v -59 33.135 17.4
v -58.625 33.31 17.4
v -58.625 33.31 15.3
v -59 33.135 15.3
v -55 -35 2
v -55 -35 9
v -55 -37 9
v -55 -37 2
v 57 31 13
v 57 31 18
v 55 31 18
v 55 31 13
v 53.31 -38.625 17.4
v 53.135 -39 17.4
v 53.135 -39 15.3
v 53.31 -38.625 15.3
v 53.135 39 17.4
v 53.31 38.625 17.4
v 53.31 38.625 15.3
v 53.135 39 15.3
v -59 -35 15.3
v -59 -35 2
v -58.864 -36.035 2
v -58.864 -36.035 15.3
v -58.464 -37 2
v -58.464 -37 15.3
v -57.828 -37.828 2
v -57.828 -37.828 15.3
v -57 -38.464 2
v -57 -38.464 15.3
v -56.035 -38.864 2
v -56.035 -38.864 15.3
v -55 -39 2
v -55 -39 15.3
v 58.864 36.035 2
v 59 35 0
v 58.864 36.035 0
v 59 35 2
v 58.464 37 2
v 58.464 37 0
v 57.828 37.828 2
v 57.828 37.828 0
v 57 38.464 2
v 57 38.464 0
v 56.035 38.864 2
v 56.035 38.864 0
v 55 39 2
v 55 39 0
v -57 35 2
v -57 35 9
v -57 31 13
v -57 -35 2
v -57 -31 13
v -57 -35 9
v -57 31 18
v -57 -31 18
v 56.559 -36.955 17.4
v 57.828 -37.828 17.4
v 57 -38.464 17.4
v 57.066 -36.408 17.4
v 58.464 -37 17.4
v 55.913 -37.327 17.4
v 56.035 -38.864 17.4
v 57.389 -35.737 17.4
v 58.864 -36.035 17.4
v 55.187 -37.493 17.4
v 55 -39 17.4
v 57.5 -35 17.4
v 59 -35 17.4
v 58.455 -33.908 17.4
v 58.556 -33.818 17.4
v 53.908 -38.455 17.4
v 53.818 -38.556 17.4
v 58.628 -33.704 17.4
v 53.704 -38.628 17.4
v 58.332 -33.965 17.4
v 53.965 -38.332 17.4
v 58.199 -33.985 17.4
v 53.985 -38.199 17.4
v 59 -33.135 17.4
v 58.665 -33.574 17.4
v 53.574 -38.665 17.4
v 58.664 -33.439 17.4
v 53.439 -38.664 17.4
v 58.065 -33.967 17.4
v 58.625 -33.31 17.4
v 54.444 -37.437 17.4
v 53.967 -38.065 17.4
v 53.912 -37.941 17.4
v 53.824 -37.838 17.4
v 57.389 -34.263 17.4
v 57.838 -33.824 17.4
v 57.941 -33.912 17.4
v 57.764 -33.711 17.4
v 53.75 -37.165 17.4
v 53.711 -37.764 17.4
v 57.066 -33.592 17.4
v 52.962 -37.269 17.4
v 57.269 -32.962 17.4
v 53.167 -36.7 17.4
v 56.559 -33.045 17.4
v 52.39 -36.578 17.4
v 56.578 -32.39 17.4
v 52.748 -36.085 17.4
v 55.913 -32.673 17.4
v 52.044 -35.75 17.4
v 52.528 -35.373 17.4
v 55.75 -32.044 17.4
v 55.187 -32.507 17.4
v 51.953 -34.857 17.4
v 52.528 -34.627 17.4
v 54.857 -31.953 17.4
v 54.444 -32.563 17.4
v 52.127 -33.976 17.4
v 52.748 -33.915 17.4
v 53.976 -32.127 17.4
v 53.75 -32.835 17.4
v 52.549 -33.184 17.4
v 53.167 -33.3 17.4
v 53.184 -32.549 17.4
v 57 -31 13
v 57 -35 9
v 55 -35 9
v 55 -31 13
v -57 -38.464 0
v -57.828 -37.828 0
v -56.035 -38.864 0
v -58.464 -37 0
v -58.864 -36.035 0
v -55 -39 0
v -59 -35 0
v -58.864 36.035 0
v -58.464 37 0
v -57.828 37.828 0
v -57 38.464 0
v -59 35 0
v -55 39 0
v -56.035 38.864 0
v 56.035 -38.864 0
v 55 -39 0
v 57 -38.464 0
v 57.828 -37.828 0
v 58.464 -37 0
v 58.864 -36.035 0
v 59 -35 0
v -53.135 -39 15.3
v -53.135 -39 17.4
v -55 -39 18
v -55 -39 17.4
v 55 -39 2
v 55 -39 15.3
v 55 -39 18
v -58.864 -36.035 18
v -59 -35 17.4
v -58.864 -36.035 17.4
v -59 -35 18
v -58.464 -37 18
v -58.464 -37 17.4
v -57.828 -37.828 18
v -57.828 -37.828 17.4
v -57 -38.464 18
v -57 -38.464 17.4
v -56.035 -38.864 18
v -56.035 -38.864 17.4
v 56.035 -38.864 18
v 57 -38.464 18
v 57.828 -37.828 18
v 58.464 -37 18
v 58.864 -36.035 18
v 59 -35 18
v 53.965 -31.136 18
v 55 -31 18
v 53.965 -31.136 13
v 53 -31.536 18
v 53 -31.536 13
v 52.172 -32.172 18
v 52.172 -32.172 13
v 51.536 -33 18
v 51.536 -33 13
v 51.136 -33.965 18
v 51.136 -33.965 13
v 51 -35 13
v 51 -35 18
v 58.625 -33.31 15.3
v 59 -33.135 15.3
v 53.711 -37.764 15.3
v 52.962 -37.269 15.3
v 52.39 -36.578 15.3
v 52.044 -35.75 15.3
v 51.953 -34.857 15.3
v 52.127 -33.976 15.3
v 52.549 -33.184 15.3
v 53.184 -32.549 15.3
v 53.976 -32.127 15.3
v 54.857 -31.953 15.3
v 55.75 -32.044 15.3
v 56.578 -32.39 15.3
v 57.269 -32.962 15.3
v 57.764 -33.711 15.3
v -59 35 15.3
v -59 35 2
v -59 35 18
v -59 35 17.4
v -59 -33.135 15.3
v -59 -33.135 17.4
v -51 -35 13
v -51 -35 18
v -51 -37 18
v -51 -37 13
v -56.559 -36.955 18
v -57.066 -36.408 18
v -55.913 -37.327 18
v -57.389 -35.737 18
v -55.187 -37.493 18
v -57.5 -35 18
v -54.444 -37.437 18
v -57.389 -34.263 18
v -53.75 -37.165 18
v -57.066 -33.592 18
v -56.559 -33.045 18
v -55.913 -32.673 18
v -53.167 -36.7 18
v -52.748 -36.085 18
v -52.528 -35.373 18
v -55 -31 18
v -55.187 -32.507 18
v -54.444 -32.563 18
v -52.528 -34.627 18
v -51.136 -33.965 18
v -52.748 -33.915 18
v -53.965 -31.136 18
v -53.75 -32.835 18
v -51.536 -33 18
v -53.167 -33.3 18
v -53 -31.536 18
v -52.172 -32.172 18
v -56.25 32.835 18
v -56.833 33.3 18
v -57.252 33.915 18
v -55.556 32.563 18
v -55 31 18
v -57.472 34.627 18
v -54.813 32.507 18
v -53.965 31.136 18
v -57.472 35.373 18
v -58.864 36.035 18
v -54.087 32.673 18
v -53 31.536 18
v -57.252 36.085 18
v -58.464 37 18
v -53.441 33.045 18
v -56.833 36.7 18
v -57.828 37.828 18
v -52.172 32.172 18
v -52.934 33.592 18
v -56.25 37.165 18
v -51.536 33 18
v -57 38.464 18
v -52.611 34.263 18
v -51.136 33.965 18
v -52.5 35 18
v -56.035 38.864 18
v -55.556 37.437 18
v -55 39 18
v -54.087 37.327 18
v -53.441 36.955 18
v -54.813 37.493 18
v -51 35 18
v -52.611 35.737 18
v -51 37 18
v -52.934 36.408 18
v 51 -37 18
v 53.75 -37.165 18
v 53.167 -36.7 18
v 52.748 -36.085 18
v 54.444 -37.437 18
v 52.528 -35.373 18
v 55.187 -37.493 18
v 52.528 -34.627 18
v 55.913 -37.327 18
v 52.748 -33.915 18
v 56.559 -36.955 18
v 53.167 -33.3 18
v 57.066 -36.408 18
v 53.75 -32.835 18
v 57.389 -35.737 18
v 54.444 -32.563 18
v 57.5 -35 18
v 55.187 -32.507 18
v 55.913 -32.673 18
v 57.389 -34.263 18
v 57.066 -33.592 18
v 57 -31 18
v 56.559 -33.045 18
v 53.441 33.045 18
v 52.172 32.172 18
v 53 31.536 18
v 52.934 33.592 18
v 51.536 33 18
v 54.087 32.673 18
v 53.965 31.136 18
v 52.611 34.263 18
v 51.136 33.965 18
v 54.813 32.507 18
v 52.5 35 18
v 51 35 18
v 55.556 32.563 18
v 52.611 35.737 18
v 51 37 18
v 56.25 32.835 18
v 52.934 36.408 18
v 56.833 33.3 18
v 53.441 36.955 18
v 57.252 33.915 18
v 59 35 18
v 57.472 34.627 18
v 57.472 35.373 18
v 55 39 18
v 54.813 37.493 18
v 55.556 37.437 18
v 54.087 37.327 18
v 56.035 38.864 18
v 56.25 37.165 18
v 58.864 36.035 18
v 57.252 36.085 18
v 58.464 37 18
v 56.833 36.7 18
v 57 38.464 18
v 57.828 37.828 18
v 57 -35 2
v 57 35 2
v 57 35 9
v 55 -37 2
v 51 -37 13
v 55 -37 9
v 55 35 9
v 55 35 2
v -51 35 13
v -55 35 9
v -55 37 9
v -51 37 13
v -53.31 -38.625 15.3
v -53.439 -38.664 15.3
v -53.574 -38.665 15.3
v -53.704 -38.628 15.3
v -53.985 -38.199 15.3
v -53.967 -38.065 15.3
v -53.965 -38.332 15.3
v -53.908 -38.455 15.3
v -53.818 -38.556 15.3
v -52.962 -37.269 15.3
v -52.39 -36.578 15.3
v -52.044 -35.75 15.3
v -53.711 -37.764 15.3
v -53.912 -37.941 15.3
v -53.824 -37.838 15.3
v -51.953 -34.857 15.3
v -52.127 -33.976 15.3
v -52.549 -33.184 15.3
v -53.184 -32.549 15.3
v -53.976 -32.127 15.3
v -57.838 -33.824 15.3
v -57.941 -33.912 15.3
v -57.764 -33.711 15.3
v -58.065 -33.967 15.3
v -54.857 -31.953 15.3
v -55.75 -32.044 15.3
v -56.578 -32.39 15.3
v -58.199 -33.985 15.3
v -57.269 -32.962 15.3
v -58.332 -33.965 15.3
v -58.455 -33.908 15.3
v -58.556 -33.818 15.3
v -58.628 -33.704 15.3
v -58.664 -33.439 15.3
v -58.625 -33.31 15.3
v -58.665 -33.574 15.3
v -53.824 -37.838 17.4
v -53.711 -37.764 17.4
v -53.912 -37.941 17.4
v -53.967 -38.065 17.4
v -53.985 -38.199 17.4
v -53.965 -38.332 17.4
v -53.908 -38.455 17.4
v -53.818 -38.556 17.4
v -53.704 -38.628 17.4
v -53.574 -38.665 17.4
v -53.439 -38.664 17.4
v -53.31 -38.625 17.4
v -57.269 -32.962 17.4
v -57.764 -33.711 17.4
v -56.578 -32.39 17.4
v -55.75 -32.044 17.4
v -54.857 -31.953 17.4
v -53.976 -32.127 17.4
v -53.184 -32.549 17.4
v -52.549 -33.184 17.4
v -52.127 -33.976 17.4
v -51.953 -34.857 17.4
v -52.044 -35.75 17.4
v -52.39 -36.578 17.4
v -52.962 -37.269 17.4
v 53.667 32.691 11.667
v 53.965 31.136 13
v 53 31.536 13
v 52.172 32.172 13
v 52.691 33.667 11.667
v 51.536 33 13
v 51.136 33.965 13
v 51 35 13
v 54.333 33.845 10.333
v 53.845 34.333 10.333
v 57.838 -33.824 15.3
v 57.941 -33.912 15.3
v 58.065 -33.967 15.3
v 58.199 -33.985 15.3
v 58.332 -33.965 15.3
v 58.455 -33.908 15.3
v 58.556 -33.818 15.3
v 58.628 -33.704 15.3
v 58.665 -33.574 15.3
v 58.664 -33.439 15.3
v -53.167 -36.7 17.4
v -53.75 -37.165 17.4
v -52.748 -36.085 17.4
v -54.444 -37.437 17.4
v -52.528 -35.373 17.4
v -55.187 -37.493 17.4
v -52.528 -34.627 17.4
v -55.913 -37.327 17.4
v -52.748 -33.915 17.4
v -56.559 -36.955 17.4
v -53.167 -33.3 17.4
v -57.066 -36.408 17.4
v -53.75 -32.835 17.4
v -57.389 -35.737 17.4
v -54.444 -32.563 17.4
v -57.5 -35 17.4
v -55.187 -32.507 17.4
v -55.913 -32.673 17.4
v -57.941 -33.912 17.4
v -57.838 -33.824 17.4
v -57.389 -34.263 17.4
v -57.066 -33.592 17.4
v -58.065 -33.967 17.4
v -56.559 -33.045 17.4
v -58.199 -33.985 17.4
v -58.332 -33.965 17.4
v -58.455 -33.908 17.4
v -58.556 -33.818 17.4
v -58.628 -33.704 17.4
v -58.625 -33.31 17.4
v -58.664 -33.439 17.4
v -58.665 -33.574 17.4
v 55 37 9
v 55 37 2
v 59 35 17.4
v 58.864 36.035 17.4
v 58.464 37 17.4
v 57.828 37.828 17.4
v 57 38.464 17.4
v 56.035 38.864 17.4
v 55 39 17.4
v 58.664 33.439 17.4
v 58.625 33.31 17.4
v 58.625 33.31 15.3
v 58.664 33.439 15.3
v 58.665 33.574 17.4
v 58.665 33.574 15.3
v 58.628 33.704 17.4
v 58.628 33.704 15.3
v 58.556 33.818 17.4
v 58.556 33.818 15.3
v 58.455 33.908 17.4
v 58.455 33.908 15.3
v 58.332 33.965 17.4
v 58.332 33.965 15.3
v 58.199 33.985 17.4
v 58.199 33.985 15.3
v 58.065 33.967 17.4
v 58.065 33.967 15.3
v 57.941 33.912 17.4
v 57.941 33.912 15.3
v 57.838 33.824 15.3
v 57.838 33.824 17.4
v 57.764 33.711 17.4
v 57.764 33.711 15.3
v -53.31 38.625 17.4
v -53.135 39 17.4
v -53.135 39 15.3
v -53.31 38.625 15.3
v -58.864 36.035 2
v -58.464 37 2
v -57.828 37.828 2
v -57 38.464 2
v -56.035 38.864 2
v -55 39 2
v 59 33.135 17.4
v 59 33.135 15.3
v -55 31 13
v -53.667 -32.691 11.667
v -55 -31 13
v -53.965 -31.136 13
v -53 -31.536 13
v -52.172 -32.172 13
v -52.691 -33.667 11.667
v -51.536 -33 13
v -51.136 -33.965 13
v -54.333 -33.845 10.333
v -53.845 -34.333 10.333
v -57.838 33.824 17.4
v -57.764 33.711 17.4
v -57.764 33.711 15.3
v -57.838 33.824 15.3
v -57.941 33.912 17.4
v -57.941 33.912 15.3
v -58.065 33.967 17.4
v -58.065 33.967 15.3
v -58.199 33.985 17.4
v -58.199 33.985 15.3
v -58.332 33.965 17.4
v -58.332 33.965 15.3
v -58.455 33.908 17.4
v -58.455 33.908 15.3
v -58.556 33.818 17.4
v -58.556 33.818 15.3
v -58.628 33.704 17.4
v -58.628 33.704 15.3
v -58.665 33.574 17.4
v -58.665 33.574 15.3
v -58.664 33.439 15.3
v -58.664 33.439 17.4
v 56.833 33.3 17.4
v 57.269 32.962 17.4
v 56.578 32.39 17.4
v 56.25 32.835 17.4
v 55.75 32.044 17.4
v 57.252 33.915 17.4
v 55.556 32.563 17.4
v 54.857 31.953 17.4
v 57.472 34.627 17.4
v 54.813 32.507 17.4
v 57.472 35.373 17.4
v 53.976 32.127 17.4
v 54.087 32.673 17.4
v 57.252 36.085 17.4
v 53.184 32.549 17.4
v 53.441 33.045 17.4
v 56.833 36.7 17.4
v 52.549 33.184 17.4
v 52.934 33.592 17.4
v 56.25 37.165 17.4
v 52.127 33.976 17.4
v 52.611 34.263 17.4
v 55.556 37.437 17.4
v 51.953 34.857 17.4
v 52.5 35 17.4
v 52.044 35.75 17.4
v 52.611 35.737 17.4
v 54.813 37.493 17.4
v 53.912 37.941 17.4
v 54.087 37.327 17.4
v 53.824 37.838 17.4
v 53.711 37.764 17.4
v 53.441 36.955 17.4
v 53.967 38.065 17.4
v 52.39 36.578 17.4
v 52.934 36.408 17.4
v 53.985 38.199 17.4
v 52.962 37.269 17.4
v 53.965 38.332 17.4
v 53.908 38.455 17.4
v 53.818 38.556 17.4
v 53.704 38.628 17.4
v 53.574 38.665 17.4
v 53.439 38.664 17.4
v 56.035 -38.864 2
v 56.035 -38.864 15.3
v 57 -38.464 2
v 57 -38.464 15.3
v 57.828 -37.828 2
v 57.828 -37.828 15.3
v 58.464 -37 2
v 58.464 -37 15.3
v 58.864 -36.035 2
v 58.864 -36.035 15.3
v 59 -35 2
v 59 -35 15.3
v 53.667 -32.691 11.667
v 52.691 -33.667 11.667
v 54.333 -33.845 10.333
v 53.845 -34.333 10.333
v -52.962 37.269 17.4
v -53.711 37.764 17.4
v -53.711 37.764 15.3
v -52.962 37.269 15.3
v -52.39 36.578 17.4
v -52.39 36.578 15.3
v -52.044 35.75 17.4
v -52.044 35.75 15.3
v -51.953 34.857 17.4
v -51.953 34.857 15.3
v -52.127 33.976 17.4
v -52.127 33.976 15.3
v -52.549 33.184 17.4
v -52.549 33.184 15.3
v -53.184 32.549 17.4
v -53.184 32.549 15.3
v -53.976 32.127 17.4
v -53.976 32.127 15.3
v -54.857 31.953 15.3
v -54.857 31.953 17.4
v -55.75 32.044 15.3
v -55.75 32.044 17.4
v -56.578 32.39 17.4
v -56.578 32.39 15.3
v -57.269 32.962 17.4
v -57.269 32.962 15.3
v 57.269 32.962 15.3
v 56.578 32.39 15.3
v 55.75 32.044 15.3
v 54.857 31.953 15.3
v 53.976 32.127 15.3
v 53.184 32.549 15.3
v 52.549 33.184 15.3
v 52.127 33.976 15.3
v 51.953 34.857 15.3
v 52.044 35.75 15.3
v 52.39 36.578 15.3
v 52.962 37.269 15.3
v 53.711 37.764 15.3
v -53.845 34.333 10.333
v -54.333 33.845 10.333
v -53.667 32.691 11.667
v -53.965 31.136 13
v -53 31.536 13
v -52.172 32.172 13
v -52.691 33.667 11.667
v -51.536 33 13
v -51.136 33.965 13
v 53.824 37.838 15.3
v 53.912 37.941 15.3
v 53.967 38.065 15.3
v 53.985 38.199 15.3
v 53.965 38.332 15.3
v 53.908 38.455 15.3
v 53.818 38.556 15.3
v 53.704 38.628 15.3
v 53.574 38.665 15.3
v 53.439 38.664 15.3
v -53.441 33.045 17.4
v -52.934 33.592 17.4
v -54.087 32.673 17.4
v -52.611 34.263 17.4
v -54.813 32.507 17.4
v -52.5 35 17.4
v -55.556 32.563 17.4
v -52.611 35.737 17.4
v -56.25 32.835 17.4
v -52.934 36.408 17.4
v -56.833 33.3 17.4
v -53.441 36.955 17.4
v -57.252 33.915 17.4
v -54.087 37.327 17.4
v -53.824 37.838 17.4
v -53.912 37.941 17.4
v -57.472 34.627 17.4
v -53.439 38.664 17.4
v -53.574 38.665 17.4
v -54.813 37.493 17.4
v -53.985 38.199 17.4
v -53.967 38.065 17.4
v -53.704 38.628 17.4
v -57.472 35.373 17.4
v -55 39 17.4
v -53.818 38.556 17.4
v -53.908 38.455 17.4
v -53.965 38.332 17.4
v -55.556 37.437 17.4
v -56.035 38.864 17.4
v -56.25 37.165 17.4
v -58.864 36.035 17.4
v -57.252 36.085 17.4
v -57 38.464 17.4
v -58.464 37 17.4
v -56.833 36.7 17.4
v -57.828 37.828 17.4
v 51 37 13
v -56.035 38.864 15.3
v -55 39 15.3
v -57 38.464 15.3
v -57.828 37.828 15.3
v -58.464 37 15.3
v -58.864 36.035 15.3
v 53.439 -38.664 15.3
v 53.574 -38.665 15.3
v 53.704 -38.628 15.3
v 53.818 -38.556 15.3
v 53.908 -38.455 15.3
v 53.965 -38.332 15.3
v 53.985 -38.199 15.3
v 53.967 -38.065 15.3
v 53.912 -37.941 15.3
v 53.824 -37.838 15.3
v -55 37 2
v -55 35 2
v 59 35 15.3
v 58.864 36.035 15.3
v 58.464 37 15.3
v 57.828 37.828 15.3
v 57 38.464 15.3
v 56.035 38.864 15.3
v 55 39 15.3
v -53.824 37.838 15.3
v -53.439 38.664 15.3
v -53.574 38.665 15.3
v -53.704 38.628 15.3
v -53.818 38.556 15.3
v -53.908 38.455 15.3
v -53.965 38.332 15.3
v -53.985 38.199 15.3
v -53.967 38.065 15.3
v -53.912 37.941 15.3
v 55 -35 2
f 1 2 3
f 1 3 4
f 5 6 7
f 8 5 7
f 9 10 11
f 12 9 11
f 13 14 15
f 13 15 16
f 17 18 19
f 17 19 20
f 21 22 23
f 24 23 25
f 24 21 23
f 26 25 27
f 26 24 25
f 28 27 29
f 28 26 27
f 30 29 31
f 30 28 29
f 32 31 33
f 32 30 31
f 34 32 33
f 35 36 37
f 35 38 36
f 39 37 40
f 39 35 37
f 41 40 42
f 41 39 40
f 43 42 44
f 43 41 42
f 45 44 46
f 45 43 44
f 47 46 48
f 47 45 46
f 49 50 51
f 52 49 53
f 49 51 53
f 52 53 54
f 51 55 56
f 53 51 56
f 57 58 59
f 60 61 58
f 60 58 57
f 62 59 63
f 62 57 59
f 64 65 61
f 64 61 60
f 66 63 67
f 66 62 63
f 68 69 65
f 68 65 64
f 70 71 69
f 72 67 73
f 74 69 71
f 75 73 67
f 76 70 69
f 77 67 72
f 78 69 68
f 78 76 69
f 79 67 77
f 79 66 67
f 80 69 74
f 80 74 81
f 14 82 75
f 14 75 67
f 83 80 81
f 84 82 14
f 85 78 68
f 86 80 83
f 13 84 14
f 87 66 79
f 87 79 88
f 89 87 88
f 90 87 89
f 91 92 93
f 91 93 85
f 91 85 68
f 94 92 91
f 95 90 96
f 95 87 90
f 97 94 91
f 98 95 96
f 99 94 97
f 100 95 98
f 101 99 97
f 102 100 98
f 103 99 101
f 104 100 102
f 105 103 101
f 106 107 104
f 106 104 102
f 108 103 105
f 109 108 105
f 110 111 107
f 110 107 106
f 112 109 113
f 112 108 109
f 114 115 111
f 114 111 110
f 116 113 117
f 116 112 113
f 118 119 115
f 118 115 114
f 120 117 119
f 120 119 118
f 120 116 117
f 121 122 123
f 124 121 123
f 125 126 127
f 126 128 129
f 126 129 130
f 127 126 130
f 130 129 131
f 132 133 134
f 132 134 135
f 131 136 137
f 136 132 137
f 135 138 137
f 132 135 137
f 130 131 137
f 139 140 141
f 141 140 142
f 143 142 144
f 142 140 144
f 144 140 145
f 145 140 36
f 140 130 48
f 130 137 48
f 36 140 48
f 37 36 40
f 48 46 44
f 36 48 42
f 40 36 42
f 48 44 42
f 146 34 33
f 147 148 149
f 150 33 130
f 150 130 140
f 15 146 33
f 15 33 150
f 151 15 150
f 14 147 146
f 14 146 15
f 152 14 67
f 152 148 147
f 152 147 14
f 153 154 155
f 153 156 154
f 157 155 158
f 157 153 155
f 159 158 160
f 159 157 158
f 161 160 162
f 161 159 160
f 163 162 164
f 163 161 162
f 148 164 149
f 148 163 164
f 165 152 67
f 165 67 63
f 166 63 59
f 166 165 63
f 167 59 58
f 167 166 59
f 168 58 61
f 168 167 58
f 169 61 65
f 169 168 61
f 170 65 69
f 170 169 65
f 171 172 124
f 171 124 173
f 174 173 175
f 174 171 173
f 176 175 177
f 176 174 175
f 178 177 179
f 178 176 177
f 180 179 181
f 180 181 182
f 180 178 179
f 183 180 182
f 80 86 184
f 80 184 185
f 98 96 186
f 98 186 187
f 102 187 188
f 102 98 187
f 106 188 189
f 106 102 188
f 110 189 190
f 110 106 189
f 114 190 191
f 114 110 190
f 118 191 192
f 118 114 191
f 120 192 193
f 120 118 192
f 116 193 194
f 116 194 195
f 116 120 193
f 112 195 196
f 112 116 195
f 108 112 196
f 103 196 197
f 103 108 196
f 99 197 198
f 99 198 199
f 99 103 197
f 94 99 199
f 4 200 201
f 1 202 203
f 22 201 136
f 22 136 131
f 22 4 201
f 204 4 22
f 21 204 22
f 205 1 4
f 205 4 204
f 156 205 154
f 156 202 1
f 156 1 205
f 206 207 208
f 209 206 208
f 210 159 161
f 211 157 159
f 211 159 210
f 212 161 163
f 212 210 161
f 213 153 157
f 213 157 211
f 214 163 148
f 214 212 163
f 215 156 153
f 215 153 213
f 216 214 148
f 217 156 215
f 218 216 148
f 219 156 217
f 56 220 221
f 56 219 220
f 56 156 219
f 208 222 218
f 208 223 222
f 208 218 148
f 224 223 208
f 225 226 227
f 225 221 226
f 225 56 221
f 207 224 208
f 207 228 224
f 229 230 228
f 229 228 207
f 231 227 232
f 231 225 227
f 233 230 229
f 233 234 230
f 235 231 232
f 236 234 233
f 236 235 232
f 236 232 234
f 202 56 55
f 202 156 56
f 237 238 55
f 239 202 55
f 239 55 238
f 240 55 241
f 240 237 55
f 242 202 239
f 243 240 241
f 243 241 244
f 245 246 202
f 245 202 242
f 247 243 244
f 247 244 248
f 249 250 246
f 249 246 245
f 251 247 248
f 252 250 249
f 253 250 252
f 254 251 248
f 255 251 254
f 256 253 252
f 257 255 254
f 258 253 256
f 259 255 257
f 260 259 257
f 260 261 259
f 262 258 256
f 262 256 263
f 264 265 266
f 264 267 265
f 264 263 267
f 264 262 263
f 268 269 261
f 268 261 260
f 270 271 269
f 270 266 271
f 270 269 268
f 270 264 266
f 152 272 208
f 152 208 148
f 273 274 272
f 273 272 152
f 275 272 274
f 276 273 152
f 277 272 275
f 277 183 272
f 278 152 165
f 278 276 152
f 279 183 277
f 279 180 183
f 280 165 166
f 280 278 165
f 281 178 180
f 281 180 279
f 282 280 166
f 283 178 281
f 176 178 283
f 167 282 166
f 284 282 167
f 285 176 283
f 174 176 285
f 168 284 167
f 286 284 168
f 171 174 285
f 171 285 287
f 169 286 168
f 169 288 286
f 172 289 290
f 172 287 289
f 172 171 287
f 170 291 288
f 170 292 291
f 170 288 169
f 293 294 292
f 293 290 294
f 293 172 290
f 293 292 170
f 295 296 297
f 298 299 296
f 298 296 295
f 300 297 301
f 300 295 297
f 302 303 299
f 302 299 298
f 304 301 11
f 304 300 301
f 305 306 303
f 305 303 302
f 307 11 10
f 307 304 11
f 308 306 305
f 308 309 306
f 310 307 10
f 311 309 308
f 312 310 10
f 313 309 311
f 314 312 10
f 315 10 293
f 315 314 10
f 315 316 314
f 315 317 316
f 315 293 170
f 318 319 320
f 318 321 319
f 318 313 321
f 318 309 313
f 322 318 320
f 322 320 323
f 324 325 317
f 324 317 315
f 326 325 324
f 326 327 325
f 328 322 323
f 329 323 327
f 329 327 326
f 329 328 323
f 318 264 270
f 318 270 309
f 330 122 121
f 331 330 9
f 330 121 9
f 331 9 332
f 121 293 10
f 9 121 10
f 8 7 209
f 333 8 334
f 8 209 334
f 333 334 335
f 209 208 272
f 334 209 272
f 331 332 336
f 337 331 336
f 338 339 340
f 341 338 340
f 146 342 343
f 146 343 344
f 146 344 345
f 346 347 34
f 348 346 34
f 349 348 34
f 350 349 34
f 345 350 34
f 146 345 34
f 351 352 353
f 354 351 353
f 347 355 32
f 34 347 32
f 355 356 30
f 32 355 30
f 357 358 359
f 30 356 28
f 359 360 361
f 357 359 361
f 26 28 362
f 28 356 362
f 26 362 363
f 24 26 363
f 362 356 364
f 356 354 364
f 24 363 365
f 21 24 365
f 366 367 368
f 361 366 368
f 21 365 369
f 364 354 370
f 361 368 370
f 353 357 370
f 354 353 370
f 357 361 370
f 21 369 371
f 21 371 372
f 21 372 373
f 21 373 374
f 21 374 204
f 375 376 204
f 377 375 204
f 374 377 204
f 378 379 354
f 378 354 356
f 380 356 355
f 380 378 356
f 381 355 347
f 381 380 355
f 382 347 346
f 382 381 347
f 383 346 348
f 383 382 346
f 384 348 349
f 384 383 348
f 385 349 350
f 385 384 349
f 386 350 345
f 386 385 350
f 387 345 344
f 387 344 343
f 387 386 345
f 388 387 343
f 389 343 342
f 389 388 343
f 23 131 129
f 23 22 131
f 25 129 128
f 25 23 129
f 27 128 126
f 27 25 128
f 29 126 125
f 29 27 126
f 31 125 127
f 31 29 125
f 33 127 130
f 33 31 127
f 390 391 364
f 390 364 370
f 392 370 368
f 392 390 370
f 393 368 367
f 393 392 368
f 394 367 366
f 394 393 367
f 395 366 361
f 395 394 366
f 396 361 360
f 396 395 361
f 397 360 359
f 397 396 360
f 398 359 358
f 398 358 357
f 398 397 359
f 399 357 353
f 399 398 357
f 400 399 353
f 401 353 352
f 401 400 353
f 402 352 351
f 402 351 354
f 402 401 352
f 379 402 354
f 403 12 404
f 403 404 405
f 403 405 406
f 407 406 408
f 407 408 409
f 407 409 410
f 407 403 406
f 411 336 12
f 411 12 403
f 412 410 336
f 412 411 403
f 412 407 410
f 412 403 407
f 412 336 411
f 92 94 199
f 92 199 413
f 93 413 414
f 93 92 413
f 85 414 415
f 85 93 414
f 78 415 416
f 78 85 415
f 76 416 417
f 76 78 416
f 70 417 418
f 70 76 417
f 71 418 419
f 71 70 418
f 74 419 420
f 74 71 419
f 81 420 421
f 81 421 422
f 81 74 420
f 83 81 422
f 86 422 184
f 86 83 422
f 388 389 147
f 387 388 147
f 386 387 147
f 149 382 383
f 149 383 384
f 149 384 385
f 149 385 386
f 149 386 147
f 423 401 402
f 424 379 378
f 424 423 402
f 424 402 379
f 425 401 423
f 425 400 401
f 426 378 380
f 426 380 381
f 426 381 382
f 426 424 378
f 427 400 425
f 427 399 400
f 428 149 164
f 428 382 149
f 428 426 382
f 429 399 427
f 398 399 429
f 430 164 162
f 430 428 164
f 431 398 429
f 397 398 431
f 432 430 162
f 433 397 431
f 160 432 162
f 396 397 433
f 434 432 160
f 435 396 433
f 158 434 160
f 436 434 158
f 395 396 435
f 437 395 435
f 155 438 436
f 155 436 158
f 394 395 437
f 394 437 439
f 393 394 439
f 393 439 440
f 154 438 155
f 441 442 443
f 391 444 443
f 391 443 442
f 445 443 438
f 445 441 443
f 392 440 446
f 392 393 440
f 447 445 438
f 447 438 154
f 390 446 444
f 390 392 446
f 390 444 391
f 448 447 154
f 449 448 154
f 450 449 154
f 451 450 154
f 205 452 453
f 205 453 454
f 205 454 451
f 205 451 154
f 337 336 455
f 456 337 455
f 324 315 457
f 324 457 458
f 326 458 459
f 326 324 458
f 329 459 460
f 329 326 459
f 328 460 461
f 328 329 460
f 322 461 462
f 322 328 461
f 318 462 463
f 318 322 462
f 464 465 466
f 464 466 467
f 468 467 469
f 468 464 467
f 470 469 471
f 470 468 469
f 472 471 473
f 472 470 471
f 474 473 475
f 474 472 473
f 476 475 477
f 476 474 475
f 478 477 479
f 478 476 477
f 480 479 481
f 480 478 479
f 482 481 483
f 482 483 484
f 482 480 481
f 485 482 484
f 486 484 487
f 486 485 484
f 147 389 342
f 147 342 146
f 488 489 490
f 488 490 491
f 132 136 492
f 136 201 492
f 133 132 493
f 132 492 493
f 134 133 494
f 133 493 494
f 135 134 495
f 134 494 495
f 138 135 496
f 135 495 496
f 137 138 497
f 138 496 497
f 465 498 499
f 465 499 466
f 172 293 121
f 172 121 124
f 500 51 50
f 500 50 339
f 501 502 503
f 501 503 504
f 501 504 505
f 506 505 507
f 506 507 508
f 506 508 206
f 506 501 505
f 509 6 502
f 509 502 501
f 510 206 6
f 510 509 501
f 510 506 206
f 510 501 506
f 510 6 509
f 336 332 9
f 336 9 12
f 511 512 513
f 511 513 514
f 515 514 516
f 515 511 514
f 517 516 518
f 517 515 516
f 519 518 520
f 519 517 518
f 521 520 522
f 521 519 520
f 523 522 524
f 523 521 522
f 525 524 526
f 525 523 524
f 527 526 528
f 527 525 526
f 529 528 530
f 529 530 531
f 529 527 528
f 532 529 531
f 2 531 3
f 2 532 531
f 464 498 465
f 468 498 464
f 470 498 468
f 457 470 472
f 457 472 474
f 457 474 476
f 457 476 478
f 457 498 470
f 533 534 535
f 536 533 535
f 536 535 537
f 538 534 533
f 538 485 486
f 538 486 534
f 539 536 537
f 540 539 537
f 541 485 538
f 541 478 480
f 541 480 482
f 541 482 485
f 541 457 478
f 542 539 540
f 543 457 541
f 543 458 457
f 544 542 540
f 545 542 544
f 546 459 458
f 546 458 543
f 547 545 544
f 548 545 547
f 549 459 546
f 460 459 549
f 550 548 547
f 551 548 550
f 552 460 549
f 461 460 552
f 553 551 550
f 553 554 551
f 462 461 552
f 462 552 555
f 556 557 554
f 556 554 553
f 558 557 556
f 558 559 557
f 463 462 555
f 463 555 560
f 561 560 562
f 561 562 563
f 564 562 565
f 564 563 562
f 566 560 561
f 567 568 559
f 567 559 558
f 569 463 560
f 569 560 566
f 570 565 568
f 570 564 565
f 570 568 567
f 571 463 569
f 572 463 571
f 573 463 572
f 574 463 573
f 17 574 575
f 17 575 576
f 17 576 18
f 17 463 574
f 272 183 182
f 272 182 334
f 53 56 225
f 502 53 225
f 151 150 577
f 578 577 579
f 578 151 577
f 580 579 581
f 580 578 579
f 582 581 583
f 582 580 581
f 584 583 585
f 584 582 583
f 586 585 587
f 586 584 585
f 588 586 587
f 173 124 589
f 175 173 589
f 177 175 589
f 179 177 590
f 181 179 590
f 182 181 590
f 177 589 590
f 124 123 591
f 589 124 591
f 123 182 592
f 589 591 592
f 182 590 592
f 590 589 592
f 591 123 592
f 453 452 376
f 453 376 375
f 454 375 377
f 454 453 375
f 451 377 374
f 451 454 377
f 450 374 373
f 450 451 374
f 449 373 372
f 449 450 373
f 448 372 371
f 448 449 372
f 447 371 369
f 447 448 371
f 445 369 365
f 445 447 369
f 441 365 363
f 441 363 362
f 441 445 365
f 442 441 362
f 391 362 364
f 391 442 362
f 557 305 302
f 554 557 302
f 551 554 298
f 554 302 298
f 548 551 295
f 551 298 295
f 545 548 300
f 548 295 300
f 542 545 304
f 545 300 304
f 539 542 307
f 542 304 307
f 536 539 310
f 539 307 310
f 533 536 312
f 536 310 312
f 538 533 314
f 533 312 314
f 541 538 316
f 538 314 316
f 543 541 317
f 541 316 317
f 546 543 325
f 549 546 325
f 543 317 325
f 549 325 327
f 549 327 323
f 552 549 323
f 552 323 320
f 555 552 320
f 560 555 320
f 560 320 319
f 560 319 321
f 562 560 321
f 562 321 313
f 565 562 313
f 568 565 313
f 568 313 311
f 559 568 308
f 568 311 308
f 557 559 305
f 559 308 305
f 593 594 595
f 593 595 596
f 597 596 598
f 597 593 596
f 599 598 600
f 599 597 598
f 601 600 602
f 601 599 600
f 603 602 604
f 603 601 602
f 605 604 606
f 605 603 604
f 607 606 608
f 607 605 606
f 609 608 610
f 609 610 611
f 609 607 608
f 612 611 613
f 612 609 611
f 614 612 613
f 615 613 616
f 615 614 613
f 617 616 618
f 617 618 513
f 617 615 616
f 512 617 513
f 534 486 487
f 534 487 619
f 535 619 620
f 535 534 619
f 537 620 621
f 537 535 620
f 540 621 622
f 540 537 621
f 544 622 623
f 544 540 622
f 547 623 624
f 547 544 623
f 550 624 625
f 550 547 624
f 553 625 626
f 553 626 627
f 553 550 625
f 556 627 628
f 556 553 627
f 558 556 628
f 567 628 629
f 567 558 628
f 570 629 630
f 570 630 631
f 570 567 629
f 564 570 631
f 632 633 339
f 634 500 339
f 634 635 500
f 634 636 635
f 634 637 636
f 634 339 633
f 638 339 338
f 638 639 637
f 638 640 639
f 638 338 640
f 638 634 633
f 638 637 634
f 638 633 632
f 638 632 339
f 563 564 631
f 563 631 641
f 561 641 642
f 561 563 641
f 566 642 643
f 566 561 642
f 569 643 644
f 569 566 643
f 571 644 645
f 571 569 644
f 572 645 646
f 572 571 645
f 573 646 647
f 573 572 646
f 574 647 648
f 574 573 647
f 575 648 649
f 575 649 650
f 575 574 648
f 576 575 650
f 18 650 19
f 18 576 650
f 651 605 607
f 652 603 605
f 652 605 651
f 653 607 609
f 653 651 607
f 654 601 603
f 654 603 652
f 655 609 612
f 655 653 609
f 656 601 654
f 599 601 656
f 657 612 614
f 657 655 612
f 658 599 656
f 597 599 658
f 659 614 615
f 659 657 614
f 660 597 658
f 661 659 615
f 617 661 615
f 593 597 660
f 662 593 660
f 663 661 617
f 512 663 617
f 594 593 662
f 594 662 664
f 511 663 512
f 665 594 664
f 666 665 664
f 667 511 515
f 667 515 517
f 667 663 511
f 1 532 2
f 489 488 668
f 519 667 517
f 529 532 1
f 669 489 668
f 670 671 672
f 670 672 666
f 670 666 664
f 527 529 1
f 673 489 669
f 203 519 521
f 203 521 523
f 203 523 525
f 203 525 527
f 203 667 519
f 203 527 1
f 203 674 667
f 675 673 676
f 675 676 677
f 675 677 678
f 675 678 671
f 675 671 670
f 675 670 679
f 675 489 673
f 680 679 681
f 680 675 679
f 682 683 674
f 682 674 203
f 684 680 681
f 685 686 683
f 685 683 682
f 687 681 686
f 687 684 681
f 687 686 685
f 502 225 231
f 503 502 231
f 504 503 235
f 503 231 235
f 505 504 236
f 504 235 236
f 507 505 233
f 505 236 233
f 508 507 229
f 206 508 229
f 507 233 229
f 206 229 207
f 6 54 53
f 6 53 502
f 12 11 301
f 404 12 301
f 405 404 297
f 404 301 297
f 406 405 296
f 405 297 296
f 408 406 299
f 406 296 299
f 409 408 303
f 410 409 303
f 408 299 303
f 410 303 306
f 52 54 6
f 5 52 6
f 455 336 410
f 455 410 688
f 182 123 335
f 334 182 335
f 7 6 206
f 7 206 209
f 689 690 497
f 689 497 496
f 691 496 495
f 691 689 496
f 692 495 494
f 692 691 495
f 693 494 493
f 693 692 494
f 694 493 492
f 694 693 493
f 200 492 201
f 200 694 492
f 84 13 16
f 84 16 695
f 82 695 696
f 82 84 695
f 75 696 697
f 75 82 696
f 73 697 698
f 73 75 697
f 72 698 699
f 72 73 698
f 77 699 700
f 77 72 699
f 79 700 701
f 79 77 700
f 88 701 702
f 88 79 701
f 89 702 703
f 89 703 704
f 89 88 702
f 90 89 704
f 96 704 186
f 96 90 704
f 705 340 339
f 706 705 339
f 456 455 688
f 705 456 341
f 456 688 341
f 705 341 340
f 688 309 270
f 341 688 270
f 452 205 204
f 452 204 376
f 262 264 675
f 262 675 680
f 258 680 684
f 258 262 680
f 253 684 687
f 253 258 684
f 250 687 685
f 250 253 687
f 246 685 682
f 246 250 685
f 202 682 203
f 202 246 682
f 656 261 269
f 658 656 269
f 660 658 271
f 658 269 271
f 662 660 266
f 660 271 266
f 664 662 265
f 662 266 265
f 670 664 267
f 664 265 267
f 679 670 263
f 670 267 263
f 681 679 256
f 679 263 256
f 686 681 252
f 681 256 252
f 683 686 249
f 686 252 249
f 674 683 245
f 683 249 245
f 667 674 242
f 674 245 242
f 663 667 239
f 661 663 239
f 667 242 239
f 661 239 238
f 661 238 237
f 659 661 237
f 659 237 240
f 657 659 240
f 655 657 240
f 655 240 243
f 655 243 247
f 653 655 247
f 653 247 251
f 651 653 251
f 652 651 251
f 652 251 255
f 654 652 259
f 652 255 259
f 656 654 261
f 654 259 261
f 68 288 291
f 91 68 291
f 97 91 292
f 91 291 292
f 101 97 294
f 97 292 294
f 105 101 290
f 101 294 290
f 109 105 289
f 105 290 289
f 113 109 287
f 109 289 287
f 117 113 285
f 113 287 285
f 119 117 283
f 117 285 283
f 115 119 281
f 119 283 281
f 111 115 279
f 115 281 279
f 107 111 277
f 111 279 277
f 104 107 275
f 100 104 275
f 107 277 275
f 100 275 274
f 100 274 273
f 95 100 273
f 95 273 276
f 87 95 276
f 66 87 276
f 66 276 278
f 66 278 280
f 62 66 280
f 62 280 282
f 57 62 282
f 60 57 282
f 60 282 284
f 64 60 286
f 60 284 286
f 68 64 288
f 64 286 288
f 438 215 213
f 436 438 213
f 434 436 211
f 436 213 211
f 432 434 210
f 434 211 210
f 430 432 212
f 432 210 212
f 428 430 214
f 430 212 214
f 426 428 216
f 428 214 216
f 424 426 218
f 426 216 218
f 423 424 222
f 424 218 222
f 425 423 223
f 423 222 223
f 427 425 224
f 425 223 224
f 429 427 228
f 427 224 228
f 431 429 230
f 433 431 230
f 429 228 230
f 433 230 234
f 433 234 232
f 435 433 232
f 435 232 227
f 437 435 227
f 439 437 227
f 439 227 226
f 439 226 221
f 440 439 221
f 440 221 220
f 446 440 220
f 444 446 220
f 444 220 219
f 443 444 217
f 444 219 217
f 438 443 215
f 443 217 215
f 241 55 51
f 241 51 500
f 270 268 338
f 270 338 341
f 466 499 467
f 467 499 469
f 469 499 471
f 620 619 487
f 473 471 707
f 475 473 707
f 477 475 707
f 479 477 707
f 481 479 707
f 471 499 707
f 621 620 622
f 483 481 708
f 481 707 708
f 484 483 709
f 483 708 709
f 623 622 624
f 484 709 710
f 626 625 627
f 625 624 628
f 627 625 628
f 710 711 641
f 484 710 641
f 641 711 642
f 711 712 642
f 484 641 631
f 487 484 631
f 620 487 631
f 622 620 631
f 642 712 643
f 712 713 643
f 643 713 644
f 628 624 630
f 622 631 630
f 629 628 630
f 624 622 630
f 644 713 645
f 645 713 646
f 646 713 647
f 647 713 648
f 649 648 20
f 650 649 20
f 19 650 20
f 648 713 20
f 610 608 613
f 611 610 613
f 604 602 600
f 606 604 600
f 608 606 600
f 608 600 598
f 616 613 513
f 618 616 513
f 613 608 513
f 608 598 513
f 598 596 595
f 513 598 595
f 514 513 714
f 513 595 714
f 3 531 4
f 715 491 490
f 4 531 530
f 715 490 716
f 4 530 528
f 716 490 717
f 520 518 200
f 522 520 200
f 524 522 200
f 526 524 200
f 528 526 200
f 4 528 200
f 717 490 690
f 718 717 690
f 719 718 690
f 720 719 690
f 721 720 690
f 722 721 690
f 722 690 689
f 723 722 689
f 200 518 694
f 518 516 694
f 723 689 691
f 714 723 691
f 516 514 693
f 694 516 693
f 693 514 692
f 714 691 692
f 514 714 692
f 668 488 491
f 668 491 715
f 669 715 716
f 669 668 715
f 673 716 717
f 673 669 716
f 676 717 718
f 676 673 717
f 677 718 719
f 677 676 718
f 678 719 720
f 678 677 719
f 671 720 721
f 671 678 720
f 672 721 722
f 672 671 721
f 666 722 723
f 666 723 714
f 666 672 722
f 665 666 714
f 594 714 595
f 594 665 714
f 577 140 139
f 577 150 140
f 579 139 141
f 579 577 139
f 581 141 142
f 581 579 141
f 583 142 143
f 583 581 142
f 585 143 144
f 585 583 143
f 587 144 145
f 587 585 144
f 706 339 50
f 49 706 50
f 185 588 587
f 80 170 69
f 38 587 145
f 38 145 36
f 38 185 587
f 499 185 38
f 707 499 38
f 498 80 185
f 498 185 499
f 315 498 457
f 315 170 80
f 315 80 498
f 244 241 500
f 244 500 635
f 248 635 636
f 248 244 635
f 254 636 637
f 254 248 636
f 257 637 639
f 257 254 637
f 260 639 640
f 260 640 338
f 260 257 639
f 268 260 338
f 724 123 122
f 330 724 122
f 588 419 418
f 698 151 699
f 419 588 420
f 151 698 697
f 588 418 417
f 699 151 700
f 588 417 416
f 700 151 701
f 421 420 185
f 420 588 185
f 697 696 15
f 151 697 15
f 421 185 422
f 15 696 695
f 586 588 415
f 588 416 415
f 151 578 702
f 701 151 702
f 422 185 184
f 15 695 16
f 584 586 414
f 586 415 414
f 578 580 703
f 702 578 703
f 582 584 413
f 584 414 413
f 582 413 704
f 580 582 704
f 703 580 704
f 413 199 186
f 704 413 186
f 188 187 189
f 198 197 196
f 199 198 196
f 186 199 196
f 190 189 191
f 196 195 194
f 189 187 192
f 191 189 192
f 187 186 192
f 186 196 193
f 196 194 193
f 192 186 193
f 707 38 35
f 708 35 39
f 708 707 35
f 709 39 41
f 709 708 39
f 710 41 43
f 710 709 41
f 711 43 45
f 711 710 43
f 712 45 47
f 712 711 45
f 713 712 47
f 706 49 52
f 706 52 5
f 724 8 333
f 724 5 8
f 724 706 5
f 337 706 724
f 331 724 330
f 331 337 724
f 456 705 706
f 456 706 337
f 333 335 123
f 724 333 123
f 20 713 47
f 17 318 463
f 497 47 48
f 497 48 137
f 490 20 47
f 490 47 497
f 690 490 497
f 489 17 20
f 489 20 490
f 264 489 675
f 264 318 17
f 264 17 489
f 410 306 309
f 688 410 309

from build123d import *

# Parameters (mm, degrees)
SKETCH_1_W          = 118
SKETCH_1_H          = 78
EXTRUDE_1_DEPTH     = 2
FILLET_1_R          = 4
EXTRUDE_START       = 16
EXTRUDE_4_DEPTH     = 16
EXTRUDE_5_DEPTH     = 9
SKETCH_6_R          = 2.5
CUT_EXTRUDE_1_DEPTH = 0.6
CUT_EXTRUDE_2_DEPTH = 2.1
CHAMFER_1_SIZE      = 4
EXTRUDE_6_DEPTH     = 7


with BuildPart() as part:
    # 草图1 → 凸台-拉伸1 (new body)
    with BuildSketch(Plane.XY):
        Rectangle(SKETCH_1_W, SKETCH_1_H)
    extrude(amount=EXTRUDE_1_DEPTH)

    # 圆角1
    fillet_1_edges = [part.edges().sort_by_distance(p)[0] for p in [
        (59, -39, 1),
        (-59, -39, 1),
        (-59, 39, 1),
        (59, 39, 1),
    ]]
    fillet(fillet_1_edges, radius=FILLET_1_R)

    # 草图4 → 凸台-拉伸4 (add)
    with BuildSketch(Plane.XY.offset(2).offset(EXTRUDE_START)):
        with BuildLine():
            Line((59, -35), (59, 35))
            ThreePointArc((59, 35), (57.828427125, 37.828427125), (55, 39))
            Line((55, 39), (-55, 39))
            ThreePointArc((-55, 39), (-57.828427125, 37.828427125), (-59, 35))
            Line((-59, 35), (-59, -35))
            ThreePointArc((-59, -35), (-57.828427125, -37.828427125), (-55, -39))
            Line((-55, -39), (55, -39))
            ThreePointArc((55, -39), (57.828427125, -37.828427125), (59, -35))
        make_face()
        with BuildLine():
            Line((57, -35), (57, 35))
            ThreePointArc((57, 35), (56.414213562, 36.414213562), (55, 37))
            Line((55, 37), (-55, 37))
            ThreePointArc((-55, 37), (-56.414213562, 36.414213562), (-57, 35))
            Line((-57, 35), (-57, -35))
            ThreePointArc((-57, -35), (-56.414213562, -36.414213562), (-55, -37))
            Line((-55, -37), (55, -37))
            ThreePointArc((55, -37), (56.414213562, -36.414213562), (57, -35))
        make_face(mode=Mode.SUBTRACT)
    extrude(amount=-EXTRUDE_4_DEPTH)

    # 草图5 → 凸台-拉伸5 (add)
    with BuildSketch(Plane.XY.offset(18)):
        with BuildLine():
            Line((-51, 35), (-51, 39))
            Line((-51, 39), (-55, 39))
            ThreePointArc((-55, 39), (-57.828427125, 37.828427125), (-59, 35))
            Line((-59, 35), (-59, 31))
            Line((-59, 31), (-55, 31))
            ThreePointArc((-55, 31), (-52.171572875, 32.171572875), (-51, 35))
        make_face()
        with BuildLine():
            Line((51, 39), (55, 39))
            ThreePointArc((55, 39), (57.828427125, 37.828427125), (59, 35))
            Line((59, 35), (59, 31))
            Line((59, 31), (55, 31))
            ThreePointArc((55, 31), (52.171572875, 32.171572875), (51, 35))
            Line((51, 35), (51, 39))
        make_face()
        with BuildLine():
            Line((51, -35), (51, -39))
            Line((51, -39), (55, -39))
            ThreePointArc((55, -39), (57.828427125, -37.828427125), (59, -35))
            Line((59, -35), (59, -31))
            Line((59, -31), (55, -31))
            ThreePointArc((55, -31), (52.171572875, -32.171572875), (51, -35))
        make_face()
        with BuildLine():
            Line((-51, -39), (-55, -39))
            ThreePointArc((-55, -39), (-57.828427125, -37.828427125), (-59, -35))
            Line((-59, -35), (-59, -31))
            Line((-59, -31), (-55, -31))
            ThreePointArc((-55, -31), (-52.171572875, -32.171572875), (-51, -35))
            Line((-51, -35), (-51, -39))
        make_face()
    extrude(amount=-EXTRUDE_5_DEPTH)

    # 草图6 → 切除-拉伸1 (cut)
    with BuildSketch(Plane.XY.offset(18)):
        with Locations((-55, 35)):
            Circle(SKETCH_6_R)
        with Locations(Location((55, 35, 0), (0, 0, 180))):
            Circle(SKETCH_6_R)
        with Locations((55, -35)):
            Circle(SKETCH_6_R)
        with Locations(Location((-55, -35, 0), (0, 0, 180))):
            Circle(SKETCH_6_R)
    extrude(amount=-CUT_EXTRUDE_1_DEPTH, mode=Mode.SUBTRACT)

    # 草图7 → 切除-拉伸2 (cut)
    with BuildSketch(Plane.XY.offset(17.4)):
        with BuildLine():
            Line((53.309526953, 38.625231148), (52.886908691, 39.531538935))
            ThreePointArc((52.886908691, 39.531538935), (58.535533906, 38.535533906), (59.531538935, 32.886908691))
            Line((59.531538935, 32.886908691), (58.625231148, 33.309526953))
            ThreePointArc((58.625231148, 33.309526953), (58.395478624, 33.940766826), (57.76423875, 33.711014302))
            ThreePointArc((57.76423875, 33.711014302), (52.843324317, 32.843324317), (53.711014302, 37.76423875))
            ThreePointArc((53.711014302, 37.76423875), (53.940766826, 38.395478624), (53.309526953, 38.625231148))
        make_face()
        with BuildLine():
            Line((-58.625231148, 33.309526953), (-59.531538935, 32.886908691))
            ThreePointArc((-59.531538935, 32.886908691), (-58.535533906, 38.535533906), (-52.886908691, 39.531538935))
            Line((-52.886908691, 39.531538935), (-53.309526953, 38.625231148))
            ThreePointArc((-53.309526953, 38.625231148), (-53.940766826, 38.395478624), (-53.711014302, 37.76423875))
            ThreePointArc((-53.711014302, 37.76423875), (-52.843324317, 32.843324317), (-57.76423875, 33.711014302))
            ThreePointArc((-57.76423875, 33.711014302), (-58.395478624, 33.940766826), (-58.625231148, 33.309526953))
        make_face()
        with BuildLine():
            Line((58.625231148, -33.309526953), (59.531538935, -32.886908691))
            ThreePointArc((59.531538935, -32.886908691), (58.535533906, -38.535533906), (52.886908691, -39.531538935))
            Line((52.886908691, -39.531538935), (53.309526953, -38.625231148))
            ThreePointArc((53.309526953, -38.625231148), (53.940766826, -38.395478624), (53.711014302, -37.76423875))
            ThreePointArc((53.711014302, -37.76423875), (52.843324317, -32.843324317), (57.76423875, -33.711014302))
            ThreePointArc((57.76423875, -33.711014302), (58.395478624, -33.940766826), (58.625231148, -33.309526953))
        make_face()
        with BuildLine():
            Line((-53.309526953, -38.625231148), (-52.886908691, -39.531538935))
            ThreePointArc((-52.886908691, -39.531538935), (-58.535533906, -38.535533906), (-59.531538935, -32.886908691))
            Line((-59.531538935, -32.886908691), (-58.625231148, -33.309526953))
            ThreePointArc((-58.625231148, -33.309526953), (-58.395478624, -33.940766826), (-57.76423875, -33.711014302))
            ThreePointArc((-57.76423875, -33.711014302), (-52.843324317, -32.843324317), (-53.711014302, -37.76423875))
            ThreePointArc((-53.711014302, -37.76423875), (-53.940766826, -38.395478624), (-53.309526953, -38.625231148))
        make_face()
    extrude(amount=-CUT_EXTRUDE_2_DEPTH, mode=Mode.SUBTRACT)

    # 倒角1
    chamfer_1_edges = [part.edges().sort_by_distance(p)[0] for p in [
        (-56, 31, 9),
        (-51, 36, 9),
        (-52.171572875, 32.171572875, 9),
        (51, 36, 9),
        (56, 31, 9),
        (52.171572875, 32.171572875, 9),
        (56, -31, 9),
        (51, -36, 9),
        (52.171572875, -32.171572875, 9),
        (-56, -31, 9),
        (-51, -36, 9),
        (-52.171572875, -32.171572875, 9),
    ]]
    chamfer(chamfer_1_edges, length=CHAMFER_1_SIZE - 0.0001)  # a hair under: the kernel refuses the full size

    # 草图8 → 凸台-拉伸6 (add)
    with BuildSketch(Plane(origin=(0, 0, 9), x_dir=(-1, 0, 0), z_dir=(0, 0, -1))):
        with BuildLine():
            Line((-55, -37), (-55, -35))
            Line((-55, -35), (-57, -35))
            ThreePointArc((-57, -35), (-56.414213562, -36.414213562), (-55, -37))
        make_face()
        with BuildLine():
            Line((57, -35), (55, -35))
            Line((55, -35), (55, -37))
            ThreePointArc((55, -37), (56.414213562, -36.414213562), (57, -35))
        make_face()
        with BuildLine():
            Line((55, 37), (55, 35))
            Line((55, 35), (57, 35))
            ThreePointArc((57, 35), (56.414213562, 36.414213562), (55, 37))
        make_face()
        with BuildLine():
            Line((-57, 35), (-55, 35))
            Line((-55, 35), (-55, 37))
            ThreePointArc((-55, 37), (-56.414213562, 36.414213562), (-57, 35))
        make_face()
    extrude(amount=EXTRUDE_6_DEPTH)


solid = part.part
